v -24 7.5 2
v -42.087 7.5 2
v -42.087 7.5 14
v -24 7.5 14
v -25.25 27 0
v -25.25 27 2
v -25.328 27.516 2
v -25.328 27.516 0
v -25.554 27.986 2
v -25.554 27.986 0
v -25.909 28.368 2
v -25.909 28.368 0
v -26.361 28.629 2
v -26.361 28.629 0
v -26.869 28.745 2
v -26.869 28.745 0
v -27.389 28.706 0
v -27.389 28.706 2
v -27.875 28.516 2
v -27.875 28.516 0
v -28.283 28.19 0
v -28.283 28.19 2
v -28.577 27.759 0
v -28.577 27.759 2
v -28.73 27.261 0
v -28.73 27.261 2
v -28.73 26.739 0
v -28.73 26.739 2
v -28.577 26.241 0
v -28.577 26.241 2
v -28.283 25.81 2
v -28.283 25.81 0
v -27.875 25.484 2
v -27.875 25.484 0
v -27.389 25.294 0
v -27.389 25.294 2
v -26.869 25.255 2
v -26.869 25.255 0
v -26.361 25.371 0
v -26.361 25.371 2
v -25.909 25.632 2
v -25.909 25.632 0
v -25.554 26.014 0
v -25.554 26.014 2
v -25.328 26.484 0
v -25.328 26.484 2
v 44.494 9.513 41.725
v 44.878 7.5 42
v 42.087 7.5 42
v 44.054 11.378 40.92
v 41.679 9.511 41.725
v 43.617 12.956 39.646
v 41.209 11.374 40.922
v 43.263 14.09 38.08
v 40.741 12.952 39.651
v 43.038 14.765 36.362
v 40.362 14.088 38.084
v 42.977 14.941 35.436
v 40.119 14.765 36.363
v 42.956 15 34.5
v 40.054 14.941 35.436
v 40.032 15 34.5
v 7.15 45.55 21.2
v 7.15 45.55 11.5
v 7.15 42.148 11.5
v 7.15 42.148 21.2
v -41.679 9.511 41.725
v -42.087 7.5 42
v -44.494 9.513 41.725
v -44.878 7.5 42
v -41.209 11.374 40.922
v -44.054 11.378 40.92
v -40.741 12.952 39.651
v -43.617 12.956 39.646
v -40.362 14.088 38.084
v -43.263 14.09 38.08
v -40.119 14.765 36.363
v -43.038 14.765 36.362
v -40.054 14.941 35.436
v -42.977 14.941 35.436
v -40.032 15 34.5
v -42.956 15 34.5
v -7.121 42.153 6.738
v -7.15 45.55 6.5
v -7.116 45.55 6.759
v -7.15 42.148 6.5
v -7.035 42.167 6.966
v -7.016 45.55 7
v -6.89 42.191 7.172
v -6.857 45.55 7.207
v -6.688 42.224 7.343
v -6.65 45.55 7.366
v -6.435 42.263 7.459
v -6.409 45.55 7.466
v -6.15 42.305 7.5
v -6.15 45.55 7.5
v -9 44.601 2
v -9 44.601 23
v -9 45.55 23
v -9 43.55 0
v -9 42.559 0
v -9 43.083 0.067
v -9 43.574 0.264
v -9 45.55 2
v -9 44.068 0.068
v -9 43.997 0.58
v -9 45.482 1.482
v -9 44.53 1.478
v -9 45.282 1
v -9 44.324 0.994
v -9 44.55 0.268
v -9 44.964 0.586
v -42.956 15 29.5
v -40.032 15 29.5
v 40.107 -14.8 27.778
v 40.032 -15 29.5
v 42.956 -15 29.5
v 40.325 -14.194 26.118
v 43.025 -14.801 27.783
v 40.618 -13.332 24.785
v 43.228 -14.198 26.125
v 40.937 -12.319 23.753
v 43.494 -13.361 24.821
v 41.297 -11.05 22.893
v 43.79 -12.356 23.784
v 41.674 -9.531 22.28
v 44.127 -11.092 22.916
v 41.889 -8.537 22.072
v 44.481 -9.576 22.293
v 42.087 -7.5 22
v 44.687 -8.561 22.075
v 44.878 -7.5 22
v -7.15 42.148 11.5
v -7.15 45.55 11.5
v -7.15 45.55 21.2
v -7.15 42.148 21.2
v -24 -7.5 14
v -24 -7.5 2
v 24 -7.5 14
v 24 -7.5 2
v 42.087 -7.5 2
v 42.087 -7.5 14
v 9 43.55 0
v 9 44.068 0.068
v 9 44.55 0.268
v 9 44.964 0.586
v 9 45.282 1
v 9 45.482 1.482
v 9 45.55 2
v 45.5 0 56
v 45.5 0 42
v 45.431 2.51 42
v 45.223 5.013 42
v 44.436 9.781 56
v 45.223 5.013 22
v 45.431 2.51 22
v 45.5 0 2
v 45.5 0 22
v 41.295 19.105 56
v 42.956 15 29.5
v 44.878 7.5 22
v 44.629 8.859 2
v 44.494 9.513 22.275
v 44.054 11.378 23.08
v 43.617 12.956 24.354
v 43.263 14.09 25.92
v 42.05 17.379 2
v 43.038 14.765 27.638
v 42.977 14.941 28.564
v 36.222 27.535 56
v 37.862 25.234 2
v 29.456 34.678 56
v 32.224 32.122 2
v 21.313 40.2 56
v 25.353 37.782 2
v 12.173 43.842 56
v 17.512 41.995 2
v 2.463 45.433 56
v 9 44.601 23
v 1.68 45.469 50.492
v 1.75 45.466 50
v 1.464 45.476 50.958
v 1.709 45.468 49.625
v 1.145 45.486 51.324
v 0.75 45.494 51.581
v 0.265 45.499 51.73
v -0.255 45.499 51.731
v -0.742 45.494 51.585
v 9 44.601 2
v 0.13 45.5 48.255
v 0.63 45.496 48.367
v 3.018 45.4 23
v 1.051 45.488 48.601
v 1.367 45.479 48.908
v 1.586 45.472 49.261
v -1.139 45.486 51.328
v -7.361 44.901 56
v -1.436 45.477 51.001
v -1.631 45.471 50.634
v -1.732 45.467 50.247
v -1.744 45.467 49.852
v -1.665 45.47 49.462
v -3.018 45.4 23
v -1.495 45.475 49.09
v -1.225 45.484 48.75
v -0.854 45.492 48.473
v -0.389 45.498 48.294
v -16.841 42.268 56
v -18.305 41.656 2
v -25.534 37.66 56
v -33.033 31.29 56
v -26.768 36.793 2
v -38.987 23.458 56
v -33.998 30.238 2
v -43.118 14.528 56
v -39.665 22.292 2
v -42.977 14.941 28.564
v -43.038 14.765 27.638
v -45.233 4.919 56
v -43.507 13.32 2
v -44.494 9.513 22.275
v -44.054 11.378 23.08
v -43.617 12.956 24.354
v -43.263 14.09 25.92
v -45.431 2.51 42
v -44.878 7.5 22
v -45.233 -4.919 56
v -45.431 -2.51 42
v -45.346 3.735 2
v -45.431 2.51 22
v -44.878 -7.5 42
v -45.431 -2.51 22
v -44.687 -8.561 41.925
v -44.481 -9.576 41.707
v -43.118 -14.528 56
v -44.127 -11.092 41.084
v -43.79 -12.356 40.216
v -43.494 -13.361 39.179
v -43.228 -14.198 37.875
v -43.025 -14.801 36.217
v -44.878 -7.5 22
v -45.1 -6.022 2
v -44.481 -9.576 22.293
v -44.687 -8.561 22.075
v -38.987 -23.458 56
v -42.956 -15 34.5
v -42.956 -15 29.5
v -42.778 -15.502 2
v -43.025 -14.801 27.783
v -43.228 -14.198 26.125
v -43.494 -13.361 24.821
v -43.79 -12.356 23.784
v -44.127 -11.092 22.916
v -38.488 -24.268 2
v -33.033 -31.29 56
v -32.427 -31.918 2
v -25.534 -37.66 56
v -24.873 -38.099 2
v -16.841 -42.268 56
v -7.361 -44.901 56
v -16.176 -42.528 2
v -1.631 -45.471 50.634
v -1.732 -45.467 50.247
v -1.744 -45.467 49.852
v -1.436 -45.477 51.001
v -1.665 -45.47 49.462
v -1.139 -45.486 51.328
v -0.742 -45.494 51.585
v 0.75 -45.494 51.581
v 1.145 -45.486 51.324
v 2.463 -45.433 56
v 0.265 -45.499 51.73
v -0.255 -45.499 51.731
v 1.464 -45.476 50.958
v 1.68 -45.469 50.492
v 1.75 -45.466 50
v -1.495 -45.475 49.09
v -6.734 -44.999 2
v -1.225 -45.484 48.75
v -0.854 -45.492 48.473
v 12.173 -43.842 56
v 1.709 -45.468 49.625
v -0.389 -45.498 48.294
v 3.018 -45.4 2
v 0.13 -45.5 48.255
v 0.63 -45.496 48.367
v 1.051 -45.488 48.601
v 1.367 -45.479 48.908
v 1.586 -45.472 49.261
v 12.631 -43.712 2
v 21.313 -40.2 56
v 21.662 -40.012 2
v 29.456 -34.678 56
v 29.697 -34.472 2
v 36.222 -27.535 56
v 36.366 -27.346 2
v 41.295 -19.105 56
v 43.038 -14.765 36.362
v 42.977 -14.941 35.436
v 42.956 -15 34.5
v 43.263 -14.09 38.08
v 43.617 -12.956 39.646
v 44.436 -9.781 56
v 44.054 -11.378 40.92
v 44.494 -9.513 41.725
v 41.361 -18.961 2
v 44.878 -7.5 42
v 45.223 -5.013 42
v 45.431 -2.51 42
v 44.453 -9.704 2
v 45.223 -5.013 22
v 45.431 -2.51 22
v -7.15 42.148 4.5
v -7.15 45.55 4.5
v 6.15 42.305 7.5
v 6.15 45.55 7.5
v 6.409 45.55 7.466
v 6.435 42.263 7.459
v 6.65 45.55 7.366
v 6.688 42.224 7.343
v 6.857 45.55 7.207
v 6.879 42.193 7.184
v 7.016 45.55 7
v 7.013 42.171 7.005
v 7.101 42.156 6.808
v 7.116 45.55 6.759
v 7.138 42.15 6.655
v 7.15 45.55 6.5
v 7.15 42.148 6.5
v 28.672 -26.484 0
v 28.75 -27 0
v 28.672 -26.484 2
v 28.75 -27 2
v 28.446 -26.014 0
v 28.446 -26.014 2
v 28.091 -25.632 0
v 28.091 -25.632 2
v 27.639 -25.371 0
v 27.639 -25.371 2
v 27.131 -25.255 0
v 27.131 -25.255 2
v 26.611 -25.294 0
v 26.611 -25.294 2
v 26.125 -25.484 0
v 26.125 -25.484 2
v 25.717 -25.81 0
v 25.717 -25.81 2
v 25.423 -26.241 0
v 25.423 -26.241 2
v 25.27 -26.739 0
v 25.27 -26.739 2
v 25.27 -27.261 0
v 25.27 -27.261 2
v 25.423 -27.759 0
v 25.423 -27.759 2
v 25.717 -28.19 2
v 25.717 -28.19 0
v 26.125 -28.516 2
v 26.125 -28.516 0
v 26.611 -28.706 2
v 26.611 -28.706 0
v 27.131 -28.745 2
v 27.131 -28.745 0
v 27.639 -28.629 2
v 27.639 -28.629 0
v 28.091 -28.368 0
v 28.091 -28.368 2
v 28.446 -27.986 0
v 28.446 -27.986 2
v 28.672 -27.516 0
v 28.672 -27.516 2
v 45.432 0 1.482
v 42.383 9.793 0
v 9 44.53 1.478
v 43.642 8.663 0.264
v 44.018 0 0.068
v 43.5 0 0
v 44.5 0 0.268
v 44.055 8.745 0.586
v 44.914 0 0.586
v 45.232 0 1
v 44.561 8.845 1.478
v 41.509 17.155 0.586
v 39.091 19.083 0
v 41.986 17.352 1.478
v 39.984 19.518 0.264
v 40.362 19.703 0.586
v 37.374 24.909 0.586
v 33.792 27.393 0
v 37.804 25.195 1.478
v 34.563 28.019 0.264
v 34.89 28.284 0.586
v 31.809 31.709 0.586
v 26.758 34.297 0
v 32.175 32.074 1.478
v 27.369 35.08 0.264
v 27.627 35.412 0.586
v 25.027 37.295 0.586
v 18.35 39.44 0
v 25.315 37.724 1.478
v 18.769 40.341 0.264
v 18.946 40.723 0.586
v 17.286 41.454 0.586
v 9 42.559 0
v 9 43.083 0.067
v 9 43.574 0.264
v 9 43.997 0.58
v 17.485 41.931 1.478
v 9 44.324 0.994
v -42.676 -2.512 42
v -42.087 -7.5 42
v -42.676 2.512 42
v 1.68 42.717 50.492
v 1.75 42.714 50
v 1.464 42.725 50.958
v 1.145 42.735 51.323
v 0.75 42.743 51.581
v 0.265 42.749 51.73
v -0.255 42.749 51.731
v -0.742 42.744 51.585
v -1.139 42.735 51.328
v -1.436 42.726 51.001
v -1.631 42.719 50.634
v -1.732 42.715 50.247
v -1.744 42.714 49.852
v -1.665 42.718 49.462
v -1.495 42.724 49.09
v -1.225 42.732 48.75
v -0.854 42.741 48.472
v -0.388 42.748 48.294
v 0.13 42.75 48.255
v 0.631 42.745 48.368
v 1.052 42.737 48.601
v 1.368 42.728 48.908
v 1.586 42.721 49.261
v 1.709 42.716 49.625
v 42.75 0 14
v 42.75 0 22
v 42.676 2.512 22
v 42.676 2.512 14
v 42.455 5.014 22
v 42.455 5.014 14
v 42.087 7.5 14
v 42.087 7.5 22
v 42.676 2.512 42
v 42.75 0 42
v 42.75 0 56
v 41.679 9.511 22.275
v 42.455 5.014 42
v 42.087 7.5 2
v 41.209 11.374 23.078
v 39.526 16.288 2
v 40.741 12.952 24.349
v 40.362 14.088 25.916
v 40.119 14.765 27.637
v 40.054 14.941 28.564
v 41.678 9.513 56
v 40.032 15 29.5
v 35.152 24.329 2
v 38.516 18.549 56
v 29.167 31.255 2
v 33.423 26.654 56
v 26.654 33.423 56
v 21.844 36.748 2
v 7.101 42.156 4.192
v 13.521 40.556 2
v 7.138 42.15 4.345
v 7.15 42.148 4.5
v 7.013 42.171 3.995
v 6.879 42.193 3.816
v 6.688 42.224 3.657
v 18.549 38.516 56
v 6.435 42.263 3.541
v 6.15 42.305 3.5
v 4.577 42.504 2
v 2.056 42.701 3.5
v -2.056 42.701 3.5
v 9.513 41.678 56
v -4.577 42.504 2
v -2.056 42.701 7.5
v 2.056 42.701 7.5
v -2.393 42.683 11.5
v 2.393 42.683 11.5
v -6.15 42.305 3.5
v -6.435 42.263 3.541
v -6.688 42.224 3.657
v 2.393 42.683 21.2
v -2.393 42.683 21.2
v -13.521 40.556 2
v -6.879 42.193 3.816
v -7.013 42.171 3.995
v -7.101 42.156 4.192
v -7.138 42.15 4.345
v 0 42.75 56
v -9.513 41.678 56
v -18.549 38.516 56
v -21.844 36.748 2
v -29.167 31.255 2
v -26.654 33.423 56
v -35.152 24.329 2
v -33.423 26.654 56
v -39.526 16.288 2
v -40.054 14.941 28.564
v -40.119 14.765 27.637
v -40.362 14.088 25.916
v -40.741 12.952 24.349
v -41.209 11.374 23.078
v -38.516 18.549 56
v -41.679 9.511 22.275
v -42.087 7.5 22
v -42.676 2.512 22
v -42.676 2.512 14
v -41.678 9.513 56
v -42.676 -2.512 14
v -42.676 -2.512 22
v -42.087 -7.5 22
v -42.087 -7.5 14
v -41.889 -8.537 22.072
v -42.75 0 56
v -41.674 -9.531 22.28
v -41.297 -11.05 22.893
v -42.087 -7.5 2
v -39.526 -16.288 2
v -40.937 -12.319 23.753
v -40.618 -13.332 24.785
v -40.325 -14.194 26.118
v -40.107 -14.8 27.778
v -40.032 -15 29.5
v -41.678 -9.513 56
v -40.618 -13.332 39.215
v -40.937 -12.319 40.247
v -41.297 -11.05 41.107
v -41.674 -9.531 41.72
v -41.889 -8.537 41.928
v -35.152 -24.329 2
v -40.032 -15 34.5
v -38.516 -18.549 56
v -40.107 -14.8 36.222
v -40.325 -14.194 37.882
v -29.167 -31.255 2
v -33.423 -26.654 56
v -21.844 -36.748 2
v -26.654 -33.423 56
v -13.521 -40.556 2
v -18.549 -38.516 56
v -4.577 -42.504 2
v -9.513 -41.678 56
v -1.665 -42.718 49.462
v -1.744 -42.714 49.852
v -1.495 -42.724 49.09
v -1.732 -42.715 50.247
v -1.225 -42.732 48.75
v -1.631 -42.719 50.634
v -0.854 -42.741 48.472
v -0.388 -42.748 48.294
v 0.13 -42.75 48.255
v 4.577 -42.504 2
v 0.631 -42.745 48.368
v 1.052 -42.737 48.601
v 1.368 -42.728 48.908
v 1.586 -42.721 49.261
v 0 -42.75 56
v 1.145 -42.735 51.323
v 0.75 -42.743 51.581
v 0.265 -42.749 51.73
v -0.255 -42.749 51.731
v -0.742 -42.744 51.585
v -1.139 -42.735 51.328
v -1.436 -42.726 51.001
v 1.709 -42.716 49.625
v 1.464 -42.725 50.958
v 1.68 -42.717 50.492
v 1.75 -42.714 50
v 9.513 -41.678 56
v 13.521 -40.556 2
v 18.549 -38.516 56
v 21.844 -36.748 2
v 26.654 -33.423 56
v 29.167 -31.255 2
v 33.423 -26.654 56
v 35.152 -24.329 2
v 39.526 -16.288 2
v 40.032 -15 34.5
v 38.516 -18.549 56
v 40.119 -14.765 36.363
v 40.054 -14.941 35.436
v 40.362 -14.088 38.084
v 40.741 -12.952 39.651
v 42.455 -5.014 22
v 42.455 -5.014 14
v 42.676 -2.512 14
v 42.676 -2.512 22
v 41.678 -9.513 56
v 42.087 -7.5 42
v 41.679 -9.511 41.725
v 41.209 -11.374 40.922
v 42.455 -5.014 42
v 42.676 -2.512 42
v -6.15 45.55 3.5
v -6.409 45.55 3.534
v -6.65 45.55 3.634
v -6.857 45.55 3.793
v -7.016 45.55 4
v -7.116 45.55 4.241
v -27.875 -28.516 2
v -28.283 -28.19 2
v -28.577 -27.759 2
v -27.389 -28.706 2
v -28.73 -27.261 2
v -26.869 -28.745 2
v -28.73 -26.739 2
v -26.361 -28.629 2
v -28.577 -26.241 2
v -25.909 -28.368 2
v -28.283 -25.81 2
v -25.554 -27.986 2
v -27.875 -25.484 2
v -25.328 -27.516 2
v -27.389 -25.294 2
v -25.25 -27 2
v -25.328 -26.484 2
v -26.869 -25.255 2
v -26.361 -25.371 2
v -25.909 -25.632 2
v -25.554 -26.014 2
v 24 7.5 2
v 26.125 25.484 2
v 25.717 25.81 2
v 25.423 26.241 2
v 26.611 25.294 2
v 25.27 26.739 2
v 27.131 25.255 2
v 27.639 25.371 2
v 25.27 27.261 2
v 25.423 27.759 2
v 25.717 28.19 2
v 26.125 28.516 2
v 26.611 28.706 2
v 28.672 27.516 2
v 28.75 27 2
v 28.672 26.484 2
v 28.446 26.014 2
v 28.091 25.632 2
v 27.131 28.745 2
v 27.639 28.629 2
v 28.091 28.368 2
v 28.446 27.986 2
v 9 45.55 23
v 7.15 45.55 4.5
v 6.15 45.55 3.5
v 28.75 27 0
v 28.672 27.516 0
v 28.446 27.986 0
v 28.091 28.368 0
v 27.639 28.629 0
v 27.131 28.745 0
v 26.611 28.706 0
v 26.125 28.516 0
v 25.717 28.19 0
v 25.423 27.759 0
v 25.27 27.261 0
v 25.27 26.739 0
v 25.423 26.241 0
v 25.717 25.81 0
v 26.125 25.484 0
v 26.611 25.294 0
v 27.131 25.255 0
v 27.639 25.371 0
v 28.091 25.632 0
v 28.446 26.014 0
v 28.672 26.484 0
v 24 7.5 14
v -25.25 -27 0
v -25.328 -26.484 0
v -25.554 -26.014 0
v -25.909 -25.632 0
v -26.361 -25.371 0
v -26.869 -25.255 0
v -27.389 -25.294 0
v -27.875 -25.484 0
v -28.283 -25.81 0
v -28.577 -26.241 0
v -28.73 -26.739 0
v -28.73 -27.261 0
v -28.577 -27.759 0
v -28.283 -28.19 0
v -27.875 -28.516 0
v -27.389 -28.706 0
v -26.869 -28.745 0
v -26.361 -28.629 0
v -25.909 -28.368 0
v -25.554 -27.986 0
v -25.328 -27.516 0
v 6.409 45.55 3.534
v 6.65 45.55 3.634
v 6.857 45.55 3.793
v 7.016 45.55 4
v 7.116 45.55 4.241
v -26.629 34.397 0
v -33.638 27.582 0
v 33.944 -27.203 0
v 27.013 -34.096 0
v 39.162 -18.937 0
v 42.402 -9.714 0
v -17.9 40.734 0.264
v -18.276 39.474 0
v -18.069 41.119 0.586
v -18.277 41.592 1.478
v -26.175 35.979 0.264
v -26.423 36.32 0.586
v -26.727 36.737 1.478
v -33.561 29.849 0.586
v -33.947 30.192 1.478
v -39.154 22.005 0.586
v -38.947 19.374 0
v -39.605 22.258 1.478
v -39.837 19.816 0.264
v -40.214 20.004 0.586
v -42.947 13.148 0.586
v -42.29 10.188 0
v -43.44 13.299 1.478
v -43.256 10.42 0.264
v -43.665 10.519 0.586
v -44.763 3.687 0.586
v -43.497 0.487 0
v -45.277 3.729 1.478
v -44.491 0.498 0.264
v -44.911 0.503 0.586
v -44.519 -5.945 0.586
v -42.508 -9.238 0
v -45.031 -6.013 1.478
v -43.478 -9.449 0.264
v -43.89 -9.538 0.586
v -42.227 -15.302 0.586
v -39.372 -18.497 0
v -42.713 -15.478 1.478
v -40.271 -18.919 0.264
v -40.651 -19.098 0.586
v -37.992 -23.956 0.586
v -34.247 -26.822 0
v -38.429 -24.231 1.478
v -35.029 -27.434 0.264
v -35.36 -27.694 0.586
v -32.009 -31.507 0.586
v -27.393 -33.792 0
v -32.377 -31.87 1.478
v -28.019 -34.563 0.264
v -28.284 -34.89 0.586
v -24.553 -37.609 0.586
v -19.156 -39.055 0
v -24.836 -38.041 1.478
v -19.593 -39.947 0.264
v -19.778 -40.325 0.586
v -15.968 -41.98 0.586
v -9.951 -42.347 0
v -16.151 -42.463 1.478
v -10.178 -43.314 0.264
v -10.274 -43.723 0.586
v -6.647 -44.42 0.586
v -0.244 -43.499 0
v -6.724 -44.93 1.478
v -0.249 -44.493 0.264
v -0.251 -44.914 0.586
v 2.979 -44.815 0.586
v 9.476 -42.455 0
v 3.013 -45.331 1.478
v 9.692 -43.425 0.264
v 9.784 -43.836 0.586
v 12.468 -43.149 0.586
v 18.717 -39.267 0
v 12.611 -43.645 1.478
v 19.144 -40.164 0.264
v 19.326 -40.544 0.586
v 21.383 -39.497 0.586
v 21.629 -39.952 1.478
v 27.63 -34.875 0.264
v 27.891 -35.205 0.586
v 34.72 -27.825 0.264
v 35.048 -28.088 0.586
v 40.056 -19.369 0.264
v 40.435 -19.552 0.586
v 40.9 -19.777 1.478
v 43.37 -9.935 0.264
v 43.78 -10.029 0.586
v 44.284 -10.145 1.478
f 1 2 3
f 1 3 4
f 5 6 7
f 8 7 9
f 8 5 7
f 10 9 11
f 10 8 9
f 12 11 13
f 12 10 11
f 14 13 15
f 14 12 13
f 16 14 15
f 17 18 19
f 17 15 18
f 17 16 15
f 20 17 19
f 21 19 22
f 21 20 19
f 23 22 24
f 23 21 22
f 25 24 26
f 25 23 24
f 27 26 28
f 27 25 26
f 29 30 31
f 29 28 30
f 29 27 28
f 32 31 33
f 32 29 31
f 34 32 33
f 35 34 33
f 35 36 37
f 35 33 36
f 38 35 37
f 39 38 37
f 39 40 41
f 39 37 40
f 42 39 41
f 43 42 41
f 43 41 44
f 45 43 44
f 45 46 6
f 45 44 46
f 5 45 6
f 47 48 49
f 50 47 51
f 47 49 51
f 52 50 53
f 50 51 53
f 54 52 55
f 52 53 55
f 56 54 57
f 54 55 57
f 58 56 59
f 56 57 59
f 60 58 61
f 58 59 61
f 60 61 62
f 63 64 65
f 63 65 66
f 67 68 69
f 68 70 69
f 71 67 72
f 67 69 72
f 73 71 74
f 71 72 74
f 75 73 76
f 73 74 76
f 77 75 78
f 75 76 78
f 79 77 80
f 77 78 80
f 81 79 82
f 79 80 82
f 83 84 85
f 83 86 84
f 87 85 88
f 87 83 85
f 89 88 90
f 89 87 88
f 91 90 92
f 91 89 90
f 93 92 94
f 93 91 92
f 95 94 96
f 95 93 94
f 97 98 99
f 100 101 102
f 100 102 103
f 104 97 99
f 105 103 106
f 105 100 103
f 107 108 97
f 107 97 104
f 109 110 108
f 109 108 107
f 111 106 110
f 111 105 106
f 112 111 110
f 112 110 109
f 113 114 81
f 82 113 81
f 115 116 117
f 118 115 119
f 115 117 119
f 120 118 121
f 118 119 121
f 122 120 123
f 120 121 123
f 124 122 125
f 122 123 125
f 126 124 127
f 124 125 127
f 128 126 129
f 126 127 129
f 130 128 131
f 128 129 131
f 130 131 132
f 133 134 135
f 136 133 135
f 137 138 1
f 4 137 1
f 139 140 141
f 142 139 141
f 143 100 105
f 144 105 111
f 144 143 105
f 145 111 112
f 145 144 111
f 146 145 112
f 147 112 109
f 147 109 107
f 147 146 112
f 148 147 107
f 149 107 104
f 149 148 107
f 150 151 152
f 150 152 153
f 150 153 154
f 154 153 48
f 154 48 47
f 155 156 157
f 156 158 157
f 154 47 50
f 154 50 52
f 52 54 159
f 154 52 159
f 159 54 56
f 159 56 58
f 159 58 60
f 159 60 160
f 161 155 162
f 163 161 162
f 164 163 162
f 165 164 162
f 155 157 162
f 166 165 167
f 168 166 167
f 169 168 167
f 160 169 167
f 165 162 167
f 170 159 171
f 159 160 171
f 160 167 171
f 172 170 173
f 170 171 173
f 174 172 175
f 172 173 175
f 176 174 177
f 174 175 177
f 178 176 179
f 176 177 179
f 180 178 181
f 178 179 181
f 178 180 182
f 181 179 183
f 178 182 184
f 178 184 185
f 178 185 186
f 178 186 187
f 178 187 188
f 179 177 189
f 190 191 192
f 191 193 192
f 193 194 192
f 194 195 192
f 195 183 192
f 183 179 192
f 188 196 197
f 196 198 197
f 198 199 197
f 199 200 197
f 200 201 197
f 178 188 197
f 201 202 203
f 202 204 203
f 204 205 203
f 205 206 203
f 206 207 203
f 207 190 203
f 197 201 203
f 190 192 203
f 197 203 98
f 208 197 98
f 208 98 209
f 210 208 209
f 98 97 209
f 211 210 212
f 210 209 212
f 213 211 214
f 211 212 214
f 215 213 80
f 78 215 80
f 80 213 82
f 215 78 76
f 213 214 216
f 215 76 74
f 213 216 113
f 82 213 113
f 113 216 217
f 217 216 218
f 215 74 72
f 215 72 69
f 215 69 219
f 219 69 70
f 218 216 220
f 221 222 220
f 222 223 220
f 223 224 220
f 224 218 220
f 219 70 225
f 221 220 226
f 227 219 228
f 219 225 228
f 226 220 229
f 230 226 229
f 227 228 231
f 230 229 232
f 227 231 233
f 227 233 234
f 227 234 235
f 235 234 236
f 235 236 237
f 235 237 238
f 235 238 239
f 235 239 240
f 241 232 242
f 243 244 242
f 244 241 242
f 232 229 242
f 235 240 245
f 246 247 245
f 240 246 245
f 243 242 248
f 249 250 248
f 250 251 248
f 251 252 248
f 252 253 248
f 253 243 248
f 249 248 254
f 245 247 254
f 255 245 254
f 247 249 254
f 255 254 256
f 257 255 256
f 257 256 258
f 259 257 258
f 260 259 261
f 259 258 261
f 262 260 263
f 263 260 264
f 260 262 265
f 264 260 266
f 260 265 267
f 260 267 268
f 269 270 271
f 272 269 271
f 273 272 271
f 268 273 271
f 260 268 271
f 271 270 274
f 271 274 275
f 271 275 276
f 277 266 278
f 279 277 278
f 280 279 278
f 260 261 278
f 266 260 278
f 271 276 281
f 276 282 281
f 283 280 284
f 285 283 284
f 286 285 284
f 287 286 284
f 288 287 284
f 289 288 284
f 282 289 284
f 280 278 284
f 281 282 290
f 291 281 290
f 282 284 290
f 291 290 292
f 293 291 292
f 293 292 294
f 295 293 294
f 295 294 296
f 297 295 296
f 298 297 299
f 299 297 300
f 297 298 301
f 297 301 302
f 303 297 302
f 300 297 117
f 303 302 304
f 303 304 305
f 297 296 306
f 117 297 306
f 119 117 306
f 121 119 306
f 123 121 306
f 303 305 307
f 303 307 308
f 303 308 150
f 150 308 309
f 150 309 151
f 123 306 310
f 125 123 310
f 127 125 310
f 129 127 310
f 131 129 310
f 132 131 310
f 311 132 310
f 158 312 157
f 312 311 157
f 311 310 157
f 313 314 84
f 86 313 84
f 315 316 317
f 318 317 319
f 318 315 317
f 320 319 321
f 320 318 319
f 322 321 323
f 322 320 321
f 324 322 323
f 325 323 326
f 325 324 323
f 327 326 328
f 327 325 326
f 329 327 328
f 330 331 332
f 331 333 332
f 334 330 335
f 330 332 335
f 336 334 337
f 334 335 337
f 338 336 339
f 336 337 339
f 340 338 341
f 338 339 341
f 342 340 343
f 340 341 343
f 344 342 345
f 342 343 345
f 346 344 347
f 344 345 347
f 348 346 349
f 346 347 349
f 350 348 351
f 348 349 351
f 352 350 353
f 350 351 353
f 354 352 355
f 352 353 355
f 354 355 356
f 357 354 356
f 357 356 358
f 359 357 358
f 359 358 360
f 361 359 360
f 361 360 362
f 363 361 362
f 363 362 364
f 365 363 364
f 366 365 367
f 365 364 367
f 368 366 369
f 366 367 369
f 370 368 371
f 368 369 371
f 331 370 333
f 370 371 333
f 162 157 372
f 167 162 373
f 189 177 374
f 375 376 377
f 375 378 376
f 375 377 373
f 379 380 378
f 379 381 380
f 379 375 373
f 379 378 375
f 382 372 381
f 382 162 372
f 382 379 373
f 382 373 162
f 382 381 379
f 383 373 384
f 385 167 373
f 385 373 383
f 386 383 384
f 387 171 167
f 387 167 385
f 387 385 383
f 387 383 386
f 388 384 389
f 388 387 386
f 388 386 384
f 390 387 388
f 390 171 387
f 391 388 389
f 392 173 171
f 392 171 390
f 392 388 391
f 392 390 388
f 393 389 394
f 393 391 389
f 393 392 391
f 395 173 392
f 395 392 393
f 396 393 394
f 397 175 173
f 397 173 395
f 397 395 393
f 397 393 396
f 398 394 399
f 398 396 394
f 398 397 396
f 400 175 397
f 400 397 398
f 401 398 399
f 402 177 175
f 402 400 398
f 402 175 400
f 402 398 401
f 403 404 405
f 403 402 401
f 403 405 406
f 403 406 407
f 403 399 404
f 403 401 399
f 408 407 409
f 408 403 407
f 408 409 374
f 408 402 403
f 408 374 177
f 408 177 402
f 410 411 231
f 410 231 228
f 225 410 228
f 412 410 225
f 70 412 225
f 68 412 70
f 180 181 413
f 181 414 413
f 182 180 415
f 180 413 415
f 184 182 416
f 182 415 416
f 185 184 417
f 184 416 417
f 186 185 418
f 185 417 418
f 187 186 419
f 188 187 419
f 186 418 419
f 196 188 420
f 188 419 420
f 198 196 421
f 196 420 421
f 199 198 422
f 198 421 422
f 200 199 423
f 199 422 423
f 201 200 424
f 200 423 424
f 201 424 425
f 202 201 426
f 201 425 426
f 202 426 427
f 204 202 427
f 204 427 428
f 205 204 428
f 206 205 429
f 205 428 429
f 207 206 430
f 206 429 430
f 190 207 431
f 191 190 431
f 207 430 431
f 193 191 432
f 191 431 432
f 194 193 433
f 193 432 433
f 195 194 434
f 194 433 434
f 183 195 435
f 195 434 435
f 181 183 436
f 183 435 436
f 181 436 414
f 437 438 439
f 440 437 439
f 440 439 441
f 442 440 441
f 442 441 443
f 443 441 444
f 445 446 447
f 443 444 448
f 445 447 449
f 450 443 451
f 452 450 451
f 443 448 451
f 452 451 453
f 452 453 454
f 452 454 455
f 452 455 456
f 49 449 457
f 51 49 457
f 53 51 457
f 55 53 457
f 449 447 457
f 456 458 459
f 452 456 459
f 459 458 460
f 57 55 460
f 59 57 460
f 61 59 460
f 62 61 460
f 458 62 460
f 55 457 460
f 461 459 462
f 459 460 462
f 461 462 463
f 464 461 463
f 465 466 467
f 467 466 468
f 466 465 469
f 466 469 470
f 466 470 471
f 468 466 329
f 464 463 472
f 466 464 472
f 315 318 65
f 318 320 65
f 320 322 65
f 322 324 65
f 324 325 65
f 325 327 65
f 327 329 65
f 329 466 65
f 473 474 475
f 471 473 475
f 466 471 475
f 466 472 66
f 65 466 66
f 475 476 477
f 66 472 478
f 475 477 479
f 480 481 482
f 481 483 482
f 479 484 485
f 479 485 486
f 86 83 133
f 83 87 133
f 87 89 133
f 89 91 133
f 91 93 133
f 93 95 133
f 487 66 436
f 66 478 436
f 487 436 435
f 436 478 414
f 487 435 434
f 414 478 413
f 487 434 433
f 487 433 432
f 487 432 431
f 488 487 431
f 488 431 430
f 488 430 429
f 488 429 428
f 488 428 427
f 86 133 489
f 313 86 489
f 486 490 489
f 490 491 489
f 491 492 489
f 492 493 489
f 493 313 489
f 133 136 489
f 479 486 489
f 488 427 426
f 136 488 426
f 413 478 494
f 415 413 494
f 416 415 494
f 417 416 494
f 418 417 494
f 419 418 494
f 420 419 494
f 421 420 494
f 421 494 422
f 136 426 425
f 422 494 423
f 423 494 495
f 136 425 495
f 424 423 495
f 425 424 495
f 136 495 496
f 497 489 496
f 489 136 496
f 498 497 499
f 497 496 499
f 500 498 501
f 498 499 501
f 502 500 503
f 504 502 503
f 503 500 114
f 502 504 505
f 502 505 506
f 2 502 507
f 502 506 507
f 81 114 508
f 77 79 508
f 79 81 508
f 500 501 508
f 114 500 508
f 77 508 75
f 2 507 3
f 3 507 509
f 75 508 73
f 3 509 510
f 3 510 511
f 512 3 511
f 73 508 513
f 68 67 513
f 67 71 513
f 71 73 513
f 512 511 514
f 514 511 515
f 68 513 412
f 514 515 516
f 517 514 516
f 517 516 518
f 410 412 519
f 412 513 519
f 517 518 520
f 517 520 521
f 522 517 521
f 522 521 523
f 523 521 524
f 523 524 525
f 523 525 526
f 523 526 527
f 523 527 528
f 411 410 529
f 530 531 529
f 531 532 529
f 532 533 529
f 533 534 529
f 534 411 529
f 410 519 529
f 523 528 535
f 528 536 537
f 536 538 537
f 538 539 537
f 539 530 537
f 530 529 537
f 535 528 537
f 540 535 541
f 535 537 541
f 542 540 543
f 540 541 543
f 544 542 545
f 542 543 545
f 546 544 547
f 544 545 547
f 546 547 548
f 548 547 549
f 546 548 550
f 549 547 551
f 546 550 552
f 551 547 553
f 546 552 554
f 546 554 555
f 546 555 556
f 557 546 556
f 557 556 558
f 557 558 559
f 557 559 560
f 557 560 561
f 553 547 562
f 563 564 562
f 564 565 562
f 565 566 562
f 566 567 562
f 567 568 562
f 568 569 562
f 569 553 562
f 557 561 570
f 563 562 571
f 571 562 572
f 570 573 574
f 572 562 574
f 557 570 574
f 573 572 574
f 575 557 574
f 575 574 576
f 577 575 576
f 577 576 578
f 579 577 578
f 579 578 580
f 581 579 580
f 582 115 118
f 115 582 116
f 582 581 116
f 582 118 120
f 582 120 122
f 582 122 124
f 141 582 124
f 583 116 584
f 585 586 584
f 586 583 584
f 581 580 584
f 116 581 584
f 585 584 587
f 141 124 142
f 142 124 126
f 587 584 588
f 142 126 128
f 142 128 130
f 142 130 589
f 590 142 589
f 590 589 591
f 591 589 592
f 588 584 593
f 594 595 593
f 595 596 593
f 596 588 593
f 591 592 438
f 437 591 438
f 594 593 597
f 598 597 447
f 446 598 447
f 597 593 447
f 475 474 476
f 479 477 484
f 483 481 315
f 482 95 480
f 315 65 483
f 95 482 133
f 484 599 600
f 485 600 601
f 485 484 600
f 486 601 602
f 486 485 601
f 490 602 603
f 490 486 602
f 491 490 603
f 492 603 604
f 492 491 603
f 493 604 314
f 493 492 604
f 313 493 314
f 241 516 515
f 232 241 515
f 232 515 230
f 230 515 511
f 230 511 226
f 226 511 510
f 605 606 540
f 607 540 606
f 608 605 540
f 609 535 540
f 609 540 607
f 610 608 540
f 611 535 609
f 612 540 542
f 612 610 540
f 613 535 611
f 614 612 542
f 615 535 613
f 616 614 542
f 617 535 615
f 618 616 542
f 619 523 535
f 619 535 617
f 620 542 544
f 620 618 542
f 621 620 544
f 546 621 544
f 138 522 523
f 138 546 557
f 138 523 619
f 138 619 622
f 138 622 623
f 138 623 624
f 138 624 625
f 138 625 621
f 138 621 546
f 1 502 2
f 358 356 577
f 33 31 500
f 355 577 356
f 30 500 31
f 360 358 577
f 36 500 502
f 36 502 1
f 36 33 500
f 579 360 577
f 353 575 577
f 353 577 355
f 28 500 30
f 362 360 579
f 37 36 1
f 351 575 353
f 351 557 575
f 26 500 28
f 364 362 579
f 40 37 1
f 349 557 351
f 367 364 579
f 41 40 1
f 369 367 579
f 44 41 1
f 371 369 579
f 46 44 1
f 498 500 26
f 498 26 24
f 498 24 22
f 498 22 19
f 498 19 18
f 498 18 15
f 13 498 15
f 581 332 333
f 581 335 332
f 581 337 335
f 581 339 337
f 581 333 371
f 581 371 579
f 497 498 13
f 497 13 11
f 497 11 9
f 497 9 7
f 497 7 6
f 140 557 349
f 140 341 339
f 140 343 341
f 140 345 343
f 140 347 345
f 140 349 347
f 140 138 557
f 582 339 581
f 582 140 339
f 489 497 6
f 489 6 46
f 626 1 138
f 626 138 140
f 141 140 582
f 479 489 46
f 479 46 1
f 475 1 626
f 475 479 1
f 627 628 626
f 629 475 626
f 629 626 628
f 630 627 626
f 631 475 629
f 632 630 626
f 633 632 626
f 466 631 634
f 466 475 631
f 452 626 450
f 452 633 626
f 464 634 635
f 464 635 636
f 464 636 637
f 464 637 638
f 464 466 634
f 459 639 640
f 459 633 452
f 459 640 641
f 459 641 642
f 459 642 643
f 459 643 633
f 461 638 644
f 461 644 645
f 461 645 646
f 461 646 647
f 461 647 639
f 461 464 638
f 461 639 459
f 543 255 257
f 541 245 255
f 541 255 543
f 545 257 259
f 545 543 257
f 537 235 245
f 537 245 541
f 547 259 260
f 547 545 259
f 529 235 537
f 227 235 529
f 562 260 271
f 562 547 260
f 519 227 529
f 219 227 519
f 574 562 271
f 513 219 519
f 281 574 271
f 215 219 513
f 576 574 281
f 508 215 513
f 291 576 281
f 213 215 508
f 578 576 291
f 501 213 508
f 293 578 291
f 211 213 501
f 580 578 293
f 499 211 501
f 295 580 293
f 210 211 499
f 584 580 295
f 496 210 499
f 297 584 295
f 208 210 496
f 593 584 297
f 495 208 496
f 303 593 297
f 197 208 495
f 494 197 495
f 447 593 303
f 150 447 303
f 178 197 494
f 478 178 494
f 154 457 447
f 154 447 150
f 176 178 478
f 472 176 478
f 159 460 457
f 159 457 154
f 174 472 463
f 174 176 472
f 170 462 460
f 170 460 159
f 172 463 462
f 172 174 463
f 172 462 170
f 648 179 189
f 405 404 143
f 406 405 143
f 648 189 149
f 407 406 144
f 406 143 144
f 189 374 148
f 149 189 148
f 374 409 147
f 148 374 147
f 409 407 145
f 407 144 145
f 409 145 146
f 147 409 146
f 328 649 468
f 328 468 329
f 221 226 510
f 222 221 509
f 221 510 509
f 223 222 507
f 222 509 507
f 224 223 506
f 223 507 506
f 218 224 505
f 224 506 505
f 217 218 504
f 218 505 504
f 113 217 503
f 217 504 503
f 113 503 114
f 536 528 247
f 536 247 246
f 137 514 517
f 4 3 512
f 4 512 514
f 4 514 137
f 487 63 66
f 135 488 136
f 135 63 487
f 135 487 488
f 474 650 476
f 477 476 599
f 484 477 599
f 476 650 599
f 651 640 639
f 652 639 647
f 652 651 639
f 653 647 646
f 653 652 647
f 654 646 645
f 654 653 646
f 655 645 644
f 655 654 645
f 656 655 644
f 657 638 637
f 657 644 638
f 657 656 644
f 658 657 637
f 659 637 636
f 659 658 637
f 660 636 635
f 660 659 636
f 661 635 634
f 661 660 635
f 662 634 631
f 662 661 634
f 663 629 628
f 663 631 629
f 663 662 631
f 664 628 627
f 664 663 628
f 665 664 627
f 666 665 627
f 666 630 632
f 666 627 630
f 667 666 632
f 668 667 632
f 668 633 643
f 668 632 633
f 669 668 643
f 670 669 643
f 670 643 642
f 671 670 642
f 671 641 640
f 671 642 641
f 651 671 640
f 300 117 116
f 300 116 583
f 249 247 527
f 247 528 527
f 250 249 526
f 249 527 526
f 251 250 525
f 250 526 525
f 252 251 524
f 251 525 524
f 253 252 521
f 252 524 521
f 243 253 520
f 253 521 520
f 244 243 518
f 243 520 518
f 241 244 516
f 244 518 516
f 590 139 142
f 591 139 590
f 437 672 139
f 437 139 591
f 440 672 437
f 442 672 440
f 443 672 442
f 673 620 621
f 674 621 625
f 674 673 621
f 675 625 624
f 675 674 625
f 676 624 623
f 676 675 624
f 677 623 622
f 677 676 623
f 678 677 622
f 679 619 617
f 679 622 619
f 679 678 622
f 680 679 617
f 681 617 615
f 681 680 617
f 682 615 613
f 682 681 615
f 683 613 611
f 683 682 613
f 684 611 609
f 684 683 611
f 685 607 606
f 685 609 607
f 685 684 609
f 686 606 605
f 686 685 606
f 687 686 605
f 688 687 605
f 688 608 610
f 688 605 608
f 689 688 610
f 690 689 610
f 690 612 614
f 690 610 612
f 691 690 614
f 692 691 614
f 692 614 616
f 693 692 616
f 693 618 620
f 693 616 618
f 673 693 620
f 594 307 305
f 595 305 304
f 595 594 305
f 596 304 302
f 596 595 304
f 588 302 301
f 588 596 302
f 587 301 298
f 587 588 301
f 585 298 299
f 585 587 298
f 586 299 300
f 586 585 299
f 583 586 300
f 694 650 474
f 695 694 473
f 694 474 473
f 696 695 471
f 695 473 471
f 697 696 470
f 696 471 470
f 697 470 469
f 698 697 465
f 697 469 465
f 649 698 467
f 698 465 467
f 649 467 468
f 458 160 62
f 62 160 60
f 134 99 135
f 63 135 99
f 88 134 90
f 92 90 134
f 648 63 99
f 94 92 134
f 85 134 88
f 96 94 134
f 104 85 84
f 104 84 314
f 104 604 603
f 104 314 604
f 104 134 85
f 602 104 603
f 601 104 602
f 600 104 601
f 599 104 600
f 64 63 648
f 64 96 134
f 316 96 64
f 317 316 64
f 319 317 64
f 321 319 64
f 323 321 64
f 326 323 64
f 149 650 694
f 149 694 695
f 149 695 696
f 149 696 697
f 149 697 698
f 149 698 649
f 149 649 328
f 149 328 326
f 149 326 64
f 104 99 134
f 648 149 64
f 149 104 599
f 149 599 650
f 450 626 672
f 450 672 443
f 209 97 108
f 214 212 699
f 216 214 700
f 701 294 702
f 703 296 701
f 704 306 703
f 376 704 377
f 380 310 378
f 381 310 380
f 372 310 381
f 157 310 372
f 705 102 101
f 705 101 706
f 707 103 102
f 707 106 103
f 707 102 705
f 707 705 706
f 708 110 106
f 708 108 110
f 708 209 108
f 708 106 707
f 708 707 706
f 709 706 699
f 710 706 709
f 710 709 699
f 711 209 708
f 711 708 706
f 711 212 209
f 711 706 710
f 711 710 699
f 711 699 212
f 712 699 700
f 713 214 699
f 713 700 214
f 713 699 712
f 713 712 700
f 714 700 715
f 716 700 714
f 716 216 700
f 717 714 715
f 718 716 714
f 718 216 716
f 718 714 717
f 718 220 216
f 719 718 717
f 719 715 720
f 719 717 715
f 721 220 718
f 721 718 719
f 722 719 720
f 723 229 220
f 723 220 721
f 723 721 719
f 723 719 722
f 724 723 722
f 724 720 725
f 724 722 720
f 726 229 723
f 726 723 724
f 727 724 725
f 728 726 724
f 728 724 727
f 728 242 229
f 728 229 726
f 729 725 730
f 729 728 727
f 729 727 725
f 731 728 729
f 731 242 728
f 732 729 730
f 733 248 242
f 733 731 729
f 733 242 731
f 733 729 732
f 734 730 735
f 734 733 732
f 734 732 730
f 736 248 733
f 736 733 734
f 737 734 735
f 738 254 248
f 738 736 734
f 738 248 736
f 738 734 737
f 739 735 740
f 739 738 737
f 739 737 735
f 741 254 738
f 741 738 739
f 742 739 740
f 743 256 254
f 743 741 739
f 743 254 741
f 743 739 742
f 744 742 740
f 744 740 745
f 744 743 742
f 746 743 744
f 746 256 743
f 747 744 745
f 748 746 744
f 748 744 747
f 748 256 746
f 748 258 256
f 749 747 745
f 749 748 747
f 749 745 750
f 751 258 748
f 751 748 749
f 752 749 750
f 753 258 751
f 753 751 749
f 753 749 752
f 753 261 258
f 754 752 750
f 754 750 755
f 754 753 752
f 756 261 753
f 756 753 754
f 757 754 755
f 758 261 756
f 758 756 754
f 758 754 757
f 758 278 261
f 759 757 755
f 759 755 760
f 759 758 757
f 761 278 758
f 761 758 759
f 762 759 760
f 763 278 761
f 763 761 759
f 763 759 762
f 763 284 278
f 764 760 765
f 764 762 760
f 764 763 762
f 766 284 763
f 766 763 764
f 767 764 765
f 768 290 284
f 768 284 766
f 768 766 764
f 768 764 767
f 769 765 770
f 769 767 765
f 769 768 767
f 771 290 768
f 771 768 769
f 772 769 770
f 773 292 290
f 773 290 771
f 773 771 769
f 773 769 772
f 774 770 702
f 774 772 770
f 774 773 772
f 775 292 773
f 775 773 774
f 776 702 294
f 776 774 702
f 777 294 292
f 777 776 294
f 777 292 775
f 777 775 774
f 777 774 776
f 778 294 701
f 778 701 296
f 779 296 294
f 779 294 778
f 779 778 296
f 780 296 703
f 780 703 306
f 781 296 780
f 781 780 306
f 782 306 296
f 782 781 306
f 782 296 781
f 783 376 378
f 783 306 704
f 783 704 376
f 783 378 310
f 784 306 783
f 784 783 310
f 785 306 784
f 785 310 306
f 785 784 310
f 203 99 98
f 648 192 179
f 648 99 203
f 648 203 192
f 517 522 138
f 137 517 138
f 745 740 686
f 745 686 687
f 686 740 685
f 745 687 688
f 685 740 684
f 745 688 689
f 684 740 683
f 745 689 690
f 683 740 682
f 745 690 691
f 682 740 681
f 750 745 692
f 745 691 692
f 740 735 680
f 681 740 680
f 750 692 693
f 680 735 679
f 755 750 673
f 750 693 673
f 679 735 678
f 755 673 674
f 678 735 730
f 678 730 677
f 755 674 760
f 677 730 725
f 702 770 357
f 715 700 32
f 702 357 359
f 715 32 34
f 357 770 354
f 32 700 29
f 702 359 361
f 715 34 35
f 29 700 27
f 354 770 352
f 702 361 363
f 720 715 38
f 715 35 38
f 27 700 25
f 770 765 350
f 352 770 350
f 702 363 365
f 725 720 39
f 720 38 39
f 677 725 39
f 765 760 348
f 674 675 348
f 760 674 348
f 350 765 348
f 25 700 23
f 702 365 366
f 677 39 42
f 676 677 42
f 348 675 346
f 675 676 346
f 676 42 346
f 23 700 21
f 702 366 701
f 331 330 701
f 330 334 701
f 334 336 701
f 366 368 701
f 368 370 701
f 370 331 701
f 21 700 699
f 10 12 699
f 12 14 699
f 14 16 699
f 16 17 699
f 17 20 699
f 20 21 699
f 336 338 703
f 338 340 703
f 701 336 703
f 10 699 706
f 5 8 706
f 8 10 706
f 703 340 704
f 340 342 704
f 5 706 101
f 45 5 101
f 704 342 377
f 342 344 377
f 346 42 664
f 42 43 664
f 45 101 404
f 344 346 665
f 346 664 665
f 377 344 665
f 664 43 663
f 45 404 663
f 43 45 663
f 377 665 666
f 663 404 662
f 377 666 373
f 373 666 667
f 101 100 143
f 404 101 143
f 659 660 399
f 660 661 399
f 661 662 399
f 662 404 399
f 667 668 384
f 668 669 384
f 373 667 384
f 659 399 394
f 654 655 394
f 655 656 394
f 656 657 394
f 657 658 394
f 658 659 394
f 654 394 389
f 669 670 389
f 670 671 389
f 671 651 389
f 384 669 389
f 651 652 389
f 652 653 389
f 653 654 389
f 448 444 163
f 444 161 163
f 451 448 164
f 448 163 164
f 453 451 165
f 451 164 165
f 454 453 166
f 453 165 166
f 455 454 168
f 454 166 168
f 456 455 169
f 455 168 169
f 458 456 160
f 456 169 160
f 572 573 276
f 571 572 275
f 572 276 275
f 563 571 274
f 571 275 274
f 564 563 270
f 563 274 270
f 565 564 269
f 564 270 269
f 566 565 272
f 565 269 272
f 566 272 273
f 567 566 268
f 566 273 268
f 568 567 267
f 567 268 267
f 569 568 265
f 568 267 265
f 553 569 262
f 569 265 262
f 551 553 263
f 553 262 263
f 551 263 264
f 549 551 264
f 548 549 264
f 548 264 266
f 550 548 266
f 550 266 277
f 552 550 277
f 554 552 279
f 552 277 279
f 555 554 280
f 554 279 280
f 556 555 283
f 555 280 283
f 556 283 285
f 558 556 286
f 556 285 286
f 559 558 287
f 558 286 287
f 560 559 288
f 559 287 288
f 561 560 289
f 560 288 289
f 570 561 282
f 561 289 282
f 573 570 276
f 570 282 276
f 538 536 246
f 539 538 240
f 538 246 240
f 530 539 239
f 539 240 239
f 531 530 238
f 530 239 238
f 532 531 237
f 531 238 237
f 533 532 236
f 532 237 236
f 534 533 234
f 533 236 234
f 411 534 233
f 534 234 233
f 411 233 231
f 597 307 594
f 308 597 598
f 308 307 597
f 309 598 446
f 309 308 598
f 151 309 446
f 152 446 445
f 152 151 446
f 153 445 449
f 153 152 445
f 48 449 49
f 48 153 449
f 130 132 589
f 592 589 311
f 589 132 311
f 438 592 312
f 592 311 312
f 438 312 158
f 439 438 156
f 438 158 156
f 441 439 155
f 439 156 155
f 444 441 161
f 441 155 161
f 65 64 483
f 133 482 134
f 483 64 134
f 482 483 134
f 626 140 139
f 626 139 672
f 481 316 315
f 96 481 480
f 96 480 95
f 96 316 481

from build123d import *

# Parameters (mm, degrees)
SKETCH_R        = 45.5
PAD_DEPTH       = 56
SKETCH001_R     = 42.75
POCKET_DEPTH    = 54
SKETCH002_W     = 20
SKETCH002_H     = 15
PAD001_DEPTH    = 12
SKETCH003_W     = 30
SKETCH003_H     = 20
POCKET001_DEPTH = 60
SKETCH004_W     = 18
SKETCH004_H     = 2.55
PAD002_DEPTH    = 23
SKETCH005_W     = 14.3
SKETCH005_H     = 4
SKETCH005_H_2   = 9.7
POCKET002_DEPTH = 5
SKETCH007_R     = 1.75
POCKET003_DEPTH = 60
FILLET_R        = 2
FILLET001_R     = 2
FILLET002_R     = 1
FILLET003_R     = 7.5
SKETCH006_R     = 1.75
POCKET004_DEPTH = 2.5


with BuildPart() as part:
    # Sketch → Pad (new body)
    with BuildSketch(Plane.XY):
        Circle(SKETCH_R)
    extrude(amount=PAD_DEPTH)

    # Sketch001 (on Face3 of Pad) → Pocket (cut)
    with BuildSketch(Plane.XY.offset(56)):
        Circle(SKETCH001_R)
    extrude(amount=-POCKET_DEPTH, mode=Mode.SUBTRACT)

    # Sketch002 (on Face5 of Pocket) → Pad001 (join)
    with BuildSketch(Plane.XY.offset(2)):
        with Locations((-34, 0)):
            Rectangle(SKETCH002_W, SKETCH002_H)
        with Locations((34, 0)):
            Rectangle(SKETCH002_W, SKETCH002_H)
    extrude(amount=PAD001_DEPTH)

    # Sketch003 → Pocket001 (cut, symmetric)
    with BuildSketch(Plane.YZ):
        with Locations((0, 32)):
            Rectangle(SKETCH003_W, SKETCH003_H)
    extrude(amount=POCKET001_DEPTH, both=True, mode=Mode.SUBTRACT)

    # Sketch004 → Pad002 (join)
    with BuildSketch(Plane.XY):
        with Locations((0, 44.275)):
            Rectangle(SKETCH004_W, SKETCH004_H)
    extrude(amount=PAD002_DEPTH)

    # Sketch005 (on Face15 of Pad002) → Pocket002 (cut)
    with BuildSketch(Plane(origin=(0, 45.55, 0), x_dir=(-1, 0, 0), z_dir=(0, 1, 0))):
        with Locations((0, 5.5)):
            Rectangle(SKETCH005_W, SKETCH005_H)
        with Locations((0, 16.35)):
            Rectangle(SKETCH005_W, SKETCH005_H_2)
    extrude(amount=-POCKET002_DEPTH, mode=Mode.SUBTRACT)

    # Sketch007 → Pocket003 (cut, symmetric)
    with BuildSketch(Plane.XZ):
        with Locations((0, 50)):
            Circle(SKETCH007_R)
    extrude(amount=POCKET003_DEPTH, both=True, mode=Mode.SUBTRACT)

    # Fillet
    fillet_edges = [part.edges().sort_by_distance(p)[0] for p in [
        (35.211859, 28.816228, 0),
        (-28.816228, -35.211859, 0),
    ]]
    fillet(fillet_edges, radius=FILLET_R)

    # Fillet001
    fillet001_edges = [part.edges().sort_by_distance(p)[0] for p in [
        (0, 45.55, 0),
    ]]
    fillet(fillet001_edges, radius=FILLET001_R)

    # Fillet002
    fillet002_edges = [part.edges().sort_by_distance(p)[0] for p in [
        (7.15, 43.848918, 3.5),
        (7.15, 43.848918, 7.5),
        (-7.15, 43.848918, 7.5),
        (-7.15, 43.848918, 3.5),
    ]]
    fillet(fillet002_edges, radius=FILLET002_R)

    # Fillet003
    fillet003_edges = [part.edges().sort_by_distance(p)[0] for p in [
        (41.494196, -15, 42),
        (41.494196, 15, 42),
        (41.494196, 15, 22),
        (41.494196, -15, 22),
        (-41.494196, 15, 42),
        (-41.494196, -15, 42),
        (-41.494196, 15, 22),
        (-41.494196, -15, 22),
    ]]
    fillet(fillet003_edges, radius=FILLET003_R)

    # Sketch006 → Pocket004 (cut, symmetric)
    with BuildSketch(Plane.XY):
        with Locations((-27, 27)):
            Circle(SKETCH006_R)
        with Locations((27, 27)):
            Circle(SKETCH006_R)
        with Locations((-27, -27)):
            Circle(SKETCH006_R)
        with Locations((27, -27)):
            Circle(SKETCH006_R)
    extrude(amount=POCKET004_DEPTH, both=True, mode=Mode.SUBTRACT)


solid = part.part
